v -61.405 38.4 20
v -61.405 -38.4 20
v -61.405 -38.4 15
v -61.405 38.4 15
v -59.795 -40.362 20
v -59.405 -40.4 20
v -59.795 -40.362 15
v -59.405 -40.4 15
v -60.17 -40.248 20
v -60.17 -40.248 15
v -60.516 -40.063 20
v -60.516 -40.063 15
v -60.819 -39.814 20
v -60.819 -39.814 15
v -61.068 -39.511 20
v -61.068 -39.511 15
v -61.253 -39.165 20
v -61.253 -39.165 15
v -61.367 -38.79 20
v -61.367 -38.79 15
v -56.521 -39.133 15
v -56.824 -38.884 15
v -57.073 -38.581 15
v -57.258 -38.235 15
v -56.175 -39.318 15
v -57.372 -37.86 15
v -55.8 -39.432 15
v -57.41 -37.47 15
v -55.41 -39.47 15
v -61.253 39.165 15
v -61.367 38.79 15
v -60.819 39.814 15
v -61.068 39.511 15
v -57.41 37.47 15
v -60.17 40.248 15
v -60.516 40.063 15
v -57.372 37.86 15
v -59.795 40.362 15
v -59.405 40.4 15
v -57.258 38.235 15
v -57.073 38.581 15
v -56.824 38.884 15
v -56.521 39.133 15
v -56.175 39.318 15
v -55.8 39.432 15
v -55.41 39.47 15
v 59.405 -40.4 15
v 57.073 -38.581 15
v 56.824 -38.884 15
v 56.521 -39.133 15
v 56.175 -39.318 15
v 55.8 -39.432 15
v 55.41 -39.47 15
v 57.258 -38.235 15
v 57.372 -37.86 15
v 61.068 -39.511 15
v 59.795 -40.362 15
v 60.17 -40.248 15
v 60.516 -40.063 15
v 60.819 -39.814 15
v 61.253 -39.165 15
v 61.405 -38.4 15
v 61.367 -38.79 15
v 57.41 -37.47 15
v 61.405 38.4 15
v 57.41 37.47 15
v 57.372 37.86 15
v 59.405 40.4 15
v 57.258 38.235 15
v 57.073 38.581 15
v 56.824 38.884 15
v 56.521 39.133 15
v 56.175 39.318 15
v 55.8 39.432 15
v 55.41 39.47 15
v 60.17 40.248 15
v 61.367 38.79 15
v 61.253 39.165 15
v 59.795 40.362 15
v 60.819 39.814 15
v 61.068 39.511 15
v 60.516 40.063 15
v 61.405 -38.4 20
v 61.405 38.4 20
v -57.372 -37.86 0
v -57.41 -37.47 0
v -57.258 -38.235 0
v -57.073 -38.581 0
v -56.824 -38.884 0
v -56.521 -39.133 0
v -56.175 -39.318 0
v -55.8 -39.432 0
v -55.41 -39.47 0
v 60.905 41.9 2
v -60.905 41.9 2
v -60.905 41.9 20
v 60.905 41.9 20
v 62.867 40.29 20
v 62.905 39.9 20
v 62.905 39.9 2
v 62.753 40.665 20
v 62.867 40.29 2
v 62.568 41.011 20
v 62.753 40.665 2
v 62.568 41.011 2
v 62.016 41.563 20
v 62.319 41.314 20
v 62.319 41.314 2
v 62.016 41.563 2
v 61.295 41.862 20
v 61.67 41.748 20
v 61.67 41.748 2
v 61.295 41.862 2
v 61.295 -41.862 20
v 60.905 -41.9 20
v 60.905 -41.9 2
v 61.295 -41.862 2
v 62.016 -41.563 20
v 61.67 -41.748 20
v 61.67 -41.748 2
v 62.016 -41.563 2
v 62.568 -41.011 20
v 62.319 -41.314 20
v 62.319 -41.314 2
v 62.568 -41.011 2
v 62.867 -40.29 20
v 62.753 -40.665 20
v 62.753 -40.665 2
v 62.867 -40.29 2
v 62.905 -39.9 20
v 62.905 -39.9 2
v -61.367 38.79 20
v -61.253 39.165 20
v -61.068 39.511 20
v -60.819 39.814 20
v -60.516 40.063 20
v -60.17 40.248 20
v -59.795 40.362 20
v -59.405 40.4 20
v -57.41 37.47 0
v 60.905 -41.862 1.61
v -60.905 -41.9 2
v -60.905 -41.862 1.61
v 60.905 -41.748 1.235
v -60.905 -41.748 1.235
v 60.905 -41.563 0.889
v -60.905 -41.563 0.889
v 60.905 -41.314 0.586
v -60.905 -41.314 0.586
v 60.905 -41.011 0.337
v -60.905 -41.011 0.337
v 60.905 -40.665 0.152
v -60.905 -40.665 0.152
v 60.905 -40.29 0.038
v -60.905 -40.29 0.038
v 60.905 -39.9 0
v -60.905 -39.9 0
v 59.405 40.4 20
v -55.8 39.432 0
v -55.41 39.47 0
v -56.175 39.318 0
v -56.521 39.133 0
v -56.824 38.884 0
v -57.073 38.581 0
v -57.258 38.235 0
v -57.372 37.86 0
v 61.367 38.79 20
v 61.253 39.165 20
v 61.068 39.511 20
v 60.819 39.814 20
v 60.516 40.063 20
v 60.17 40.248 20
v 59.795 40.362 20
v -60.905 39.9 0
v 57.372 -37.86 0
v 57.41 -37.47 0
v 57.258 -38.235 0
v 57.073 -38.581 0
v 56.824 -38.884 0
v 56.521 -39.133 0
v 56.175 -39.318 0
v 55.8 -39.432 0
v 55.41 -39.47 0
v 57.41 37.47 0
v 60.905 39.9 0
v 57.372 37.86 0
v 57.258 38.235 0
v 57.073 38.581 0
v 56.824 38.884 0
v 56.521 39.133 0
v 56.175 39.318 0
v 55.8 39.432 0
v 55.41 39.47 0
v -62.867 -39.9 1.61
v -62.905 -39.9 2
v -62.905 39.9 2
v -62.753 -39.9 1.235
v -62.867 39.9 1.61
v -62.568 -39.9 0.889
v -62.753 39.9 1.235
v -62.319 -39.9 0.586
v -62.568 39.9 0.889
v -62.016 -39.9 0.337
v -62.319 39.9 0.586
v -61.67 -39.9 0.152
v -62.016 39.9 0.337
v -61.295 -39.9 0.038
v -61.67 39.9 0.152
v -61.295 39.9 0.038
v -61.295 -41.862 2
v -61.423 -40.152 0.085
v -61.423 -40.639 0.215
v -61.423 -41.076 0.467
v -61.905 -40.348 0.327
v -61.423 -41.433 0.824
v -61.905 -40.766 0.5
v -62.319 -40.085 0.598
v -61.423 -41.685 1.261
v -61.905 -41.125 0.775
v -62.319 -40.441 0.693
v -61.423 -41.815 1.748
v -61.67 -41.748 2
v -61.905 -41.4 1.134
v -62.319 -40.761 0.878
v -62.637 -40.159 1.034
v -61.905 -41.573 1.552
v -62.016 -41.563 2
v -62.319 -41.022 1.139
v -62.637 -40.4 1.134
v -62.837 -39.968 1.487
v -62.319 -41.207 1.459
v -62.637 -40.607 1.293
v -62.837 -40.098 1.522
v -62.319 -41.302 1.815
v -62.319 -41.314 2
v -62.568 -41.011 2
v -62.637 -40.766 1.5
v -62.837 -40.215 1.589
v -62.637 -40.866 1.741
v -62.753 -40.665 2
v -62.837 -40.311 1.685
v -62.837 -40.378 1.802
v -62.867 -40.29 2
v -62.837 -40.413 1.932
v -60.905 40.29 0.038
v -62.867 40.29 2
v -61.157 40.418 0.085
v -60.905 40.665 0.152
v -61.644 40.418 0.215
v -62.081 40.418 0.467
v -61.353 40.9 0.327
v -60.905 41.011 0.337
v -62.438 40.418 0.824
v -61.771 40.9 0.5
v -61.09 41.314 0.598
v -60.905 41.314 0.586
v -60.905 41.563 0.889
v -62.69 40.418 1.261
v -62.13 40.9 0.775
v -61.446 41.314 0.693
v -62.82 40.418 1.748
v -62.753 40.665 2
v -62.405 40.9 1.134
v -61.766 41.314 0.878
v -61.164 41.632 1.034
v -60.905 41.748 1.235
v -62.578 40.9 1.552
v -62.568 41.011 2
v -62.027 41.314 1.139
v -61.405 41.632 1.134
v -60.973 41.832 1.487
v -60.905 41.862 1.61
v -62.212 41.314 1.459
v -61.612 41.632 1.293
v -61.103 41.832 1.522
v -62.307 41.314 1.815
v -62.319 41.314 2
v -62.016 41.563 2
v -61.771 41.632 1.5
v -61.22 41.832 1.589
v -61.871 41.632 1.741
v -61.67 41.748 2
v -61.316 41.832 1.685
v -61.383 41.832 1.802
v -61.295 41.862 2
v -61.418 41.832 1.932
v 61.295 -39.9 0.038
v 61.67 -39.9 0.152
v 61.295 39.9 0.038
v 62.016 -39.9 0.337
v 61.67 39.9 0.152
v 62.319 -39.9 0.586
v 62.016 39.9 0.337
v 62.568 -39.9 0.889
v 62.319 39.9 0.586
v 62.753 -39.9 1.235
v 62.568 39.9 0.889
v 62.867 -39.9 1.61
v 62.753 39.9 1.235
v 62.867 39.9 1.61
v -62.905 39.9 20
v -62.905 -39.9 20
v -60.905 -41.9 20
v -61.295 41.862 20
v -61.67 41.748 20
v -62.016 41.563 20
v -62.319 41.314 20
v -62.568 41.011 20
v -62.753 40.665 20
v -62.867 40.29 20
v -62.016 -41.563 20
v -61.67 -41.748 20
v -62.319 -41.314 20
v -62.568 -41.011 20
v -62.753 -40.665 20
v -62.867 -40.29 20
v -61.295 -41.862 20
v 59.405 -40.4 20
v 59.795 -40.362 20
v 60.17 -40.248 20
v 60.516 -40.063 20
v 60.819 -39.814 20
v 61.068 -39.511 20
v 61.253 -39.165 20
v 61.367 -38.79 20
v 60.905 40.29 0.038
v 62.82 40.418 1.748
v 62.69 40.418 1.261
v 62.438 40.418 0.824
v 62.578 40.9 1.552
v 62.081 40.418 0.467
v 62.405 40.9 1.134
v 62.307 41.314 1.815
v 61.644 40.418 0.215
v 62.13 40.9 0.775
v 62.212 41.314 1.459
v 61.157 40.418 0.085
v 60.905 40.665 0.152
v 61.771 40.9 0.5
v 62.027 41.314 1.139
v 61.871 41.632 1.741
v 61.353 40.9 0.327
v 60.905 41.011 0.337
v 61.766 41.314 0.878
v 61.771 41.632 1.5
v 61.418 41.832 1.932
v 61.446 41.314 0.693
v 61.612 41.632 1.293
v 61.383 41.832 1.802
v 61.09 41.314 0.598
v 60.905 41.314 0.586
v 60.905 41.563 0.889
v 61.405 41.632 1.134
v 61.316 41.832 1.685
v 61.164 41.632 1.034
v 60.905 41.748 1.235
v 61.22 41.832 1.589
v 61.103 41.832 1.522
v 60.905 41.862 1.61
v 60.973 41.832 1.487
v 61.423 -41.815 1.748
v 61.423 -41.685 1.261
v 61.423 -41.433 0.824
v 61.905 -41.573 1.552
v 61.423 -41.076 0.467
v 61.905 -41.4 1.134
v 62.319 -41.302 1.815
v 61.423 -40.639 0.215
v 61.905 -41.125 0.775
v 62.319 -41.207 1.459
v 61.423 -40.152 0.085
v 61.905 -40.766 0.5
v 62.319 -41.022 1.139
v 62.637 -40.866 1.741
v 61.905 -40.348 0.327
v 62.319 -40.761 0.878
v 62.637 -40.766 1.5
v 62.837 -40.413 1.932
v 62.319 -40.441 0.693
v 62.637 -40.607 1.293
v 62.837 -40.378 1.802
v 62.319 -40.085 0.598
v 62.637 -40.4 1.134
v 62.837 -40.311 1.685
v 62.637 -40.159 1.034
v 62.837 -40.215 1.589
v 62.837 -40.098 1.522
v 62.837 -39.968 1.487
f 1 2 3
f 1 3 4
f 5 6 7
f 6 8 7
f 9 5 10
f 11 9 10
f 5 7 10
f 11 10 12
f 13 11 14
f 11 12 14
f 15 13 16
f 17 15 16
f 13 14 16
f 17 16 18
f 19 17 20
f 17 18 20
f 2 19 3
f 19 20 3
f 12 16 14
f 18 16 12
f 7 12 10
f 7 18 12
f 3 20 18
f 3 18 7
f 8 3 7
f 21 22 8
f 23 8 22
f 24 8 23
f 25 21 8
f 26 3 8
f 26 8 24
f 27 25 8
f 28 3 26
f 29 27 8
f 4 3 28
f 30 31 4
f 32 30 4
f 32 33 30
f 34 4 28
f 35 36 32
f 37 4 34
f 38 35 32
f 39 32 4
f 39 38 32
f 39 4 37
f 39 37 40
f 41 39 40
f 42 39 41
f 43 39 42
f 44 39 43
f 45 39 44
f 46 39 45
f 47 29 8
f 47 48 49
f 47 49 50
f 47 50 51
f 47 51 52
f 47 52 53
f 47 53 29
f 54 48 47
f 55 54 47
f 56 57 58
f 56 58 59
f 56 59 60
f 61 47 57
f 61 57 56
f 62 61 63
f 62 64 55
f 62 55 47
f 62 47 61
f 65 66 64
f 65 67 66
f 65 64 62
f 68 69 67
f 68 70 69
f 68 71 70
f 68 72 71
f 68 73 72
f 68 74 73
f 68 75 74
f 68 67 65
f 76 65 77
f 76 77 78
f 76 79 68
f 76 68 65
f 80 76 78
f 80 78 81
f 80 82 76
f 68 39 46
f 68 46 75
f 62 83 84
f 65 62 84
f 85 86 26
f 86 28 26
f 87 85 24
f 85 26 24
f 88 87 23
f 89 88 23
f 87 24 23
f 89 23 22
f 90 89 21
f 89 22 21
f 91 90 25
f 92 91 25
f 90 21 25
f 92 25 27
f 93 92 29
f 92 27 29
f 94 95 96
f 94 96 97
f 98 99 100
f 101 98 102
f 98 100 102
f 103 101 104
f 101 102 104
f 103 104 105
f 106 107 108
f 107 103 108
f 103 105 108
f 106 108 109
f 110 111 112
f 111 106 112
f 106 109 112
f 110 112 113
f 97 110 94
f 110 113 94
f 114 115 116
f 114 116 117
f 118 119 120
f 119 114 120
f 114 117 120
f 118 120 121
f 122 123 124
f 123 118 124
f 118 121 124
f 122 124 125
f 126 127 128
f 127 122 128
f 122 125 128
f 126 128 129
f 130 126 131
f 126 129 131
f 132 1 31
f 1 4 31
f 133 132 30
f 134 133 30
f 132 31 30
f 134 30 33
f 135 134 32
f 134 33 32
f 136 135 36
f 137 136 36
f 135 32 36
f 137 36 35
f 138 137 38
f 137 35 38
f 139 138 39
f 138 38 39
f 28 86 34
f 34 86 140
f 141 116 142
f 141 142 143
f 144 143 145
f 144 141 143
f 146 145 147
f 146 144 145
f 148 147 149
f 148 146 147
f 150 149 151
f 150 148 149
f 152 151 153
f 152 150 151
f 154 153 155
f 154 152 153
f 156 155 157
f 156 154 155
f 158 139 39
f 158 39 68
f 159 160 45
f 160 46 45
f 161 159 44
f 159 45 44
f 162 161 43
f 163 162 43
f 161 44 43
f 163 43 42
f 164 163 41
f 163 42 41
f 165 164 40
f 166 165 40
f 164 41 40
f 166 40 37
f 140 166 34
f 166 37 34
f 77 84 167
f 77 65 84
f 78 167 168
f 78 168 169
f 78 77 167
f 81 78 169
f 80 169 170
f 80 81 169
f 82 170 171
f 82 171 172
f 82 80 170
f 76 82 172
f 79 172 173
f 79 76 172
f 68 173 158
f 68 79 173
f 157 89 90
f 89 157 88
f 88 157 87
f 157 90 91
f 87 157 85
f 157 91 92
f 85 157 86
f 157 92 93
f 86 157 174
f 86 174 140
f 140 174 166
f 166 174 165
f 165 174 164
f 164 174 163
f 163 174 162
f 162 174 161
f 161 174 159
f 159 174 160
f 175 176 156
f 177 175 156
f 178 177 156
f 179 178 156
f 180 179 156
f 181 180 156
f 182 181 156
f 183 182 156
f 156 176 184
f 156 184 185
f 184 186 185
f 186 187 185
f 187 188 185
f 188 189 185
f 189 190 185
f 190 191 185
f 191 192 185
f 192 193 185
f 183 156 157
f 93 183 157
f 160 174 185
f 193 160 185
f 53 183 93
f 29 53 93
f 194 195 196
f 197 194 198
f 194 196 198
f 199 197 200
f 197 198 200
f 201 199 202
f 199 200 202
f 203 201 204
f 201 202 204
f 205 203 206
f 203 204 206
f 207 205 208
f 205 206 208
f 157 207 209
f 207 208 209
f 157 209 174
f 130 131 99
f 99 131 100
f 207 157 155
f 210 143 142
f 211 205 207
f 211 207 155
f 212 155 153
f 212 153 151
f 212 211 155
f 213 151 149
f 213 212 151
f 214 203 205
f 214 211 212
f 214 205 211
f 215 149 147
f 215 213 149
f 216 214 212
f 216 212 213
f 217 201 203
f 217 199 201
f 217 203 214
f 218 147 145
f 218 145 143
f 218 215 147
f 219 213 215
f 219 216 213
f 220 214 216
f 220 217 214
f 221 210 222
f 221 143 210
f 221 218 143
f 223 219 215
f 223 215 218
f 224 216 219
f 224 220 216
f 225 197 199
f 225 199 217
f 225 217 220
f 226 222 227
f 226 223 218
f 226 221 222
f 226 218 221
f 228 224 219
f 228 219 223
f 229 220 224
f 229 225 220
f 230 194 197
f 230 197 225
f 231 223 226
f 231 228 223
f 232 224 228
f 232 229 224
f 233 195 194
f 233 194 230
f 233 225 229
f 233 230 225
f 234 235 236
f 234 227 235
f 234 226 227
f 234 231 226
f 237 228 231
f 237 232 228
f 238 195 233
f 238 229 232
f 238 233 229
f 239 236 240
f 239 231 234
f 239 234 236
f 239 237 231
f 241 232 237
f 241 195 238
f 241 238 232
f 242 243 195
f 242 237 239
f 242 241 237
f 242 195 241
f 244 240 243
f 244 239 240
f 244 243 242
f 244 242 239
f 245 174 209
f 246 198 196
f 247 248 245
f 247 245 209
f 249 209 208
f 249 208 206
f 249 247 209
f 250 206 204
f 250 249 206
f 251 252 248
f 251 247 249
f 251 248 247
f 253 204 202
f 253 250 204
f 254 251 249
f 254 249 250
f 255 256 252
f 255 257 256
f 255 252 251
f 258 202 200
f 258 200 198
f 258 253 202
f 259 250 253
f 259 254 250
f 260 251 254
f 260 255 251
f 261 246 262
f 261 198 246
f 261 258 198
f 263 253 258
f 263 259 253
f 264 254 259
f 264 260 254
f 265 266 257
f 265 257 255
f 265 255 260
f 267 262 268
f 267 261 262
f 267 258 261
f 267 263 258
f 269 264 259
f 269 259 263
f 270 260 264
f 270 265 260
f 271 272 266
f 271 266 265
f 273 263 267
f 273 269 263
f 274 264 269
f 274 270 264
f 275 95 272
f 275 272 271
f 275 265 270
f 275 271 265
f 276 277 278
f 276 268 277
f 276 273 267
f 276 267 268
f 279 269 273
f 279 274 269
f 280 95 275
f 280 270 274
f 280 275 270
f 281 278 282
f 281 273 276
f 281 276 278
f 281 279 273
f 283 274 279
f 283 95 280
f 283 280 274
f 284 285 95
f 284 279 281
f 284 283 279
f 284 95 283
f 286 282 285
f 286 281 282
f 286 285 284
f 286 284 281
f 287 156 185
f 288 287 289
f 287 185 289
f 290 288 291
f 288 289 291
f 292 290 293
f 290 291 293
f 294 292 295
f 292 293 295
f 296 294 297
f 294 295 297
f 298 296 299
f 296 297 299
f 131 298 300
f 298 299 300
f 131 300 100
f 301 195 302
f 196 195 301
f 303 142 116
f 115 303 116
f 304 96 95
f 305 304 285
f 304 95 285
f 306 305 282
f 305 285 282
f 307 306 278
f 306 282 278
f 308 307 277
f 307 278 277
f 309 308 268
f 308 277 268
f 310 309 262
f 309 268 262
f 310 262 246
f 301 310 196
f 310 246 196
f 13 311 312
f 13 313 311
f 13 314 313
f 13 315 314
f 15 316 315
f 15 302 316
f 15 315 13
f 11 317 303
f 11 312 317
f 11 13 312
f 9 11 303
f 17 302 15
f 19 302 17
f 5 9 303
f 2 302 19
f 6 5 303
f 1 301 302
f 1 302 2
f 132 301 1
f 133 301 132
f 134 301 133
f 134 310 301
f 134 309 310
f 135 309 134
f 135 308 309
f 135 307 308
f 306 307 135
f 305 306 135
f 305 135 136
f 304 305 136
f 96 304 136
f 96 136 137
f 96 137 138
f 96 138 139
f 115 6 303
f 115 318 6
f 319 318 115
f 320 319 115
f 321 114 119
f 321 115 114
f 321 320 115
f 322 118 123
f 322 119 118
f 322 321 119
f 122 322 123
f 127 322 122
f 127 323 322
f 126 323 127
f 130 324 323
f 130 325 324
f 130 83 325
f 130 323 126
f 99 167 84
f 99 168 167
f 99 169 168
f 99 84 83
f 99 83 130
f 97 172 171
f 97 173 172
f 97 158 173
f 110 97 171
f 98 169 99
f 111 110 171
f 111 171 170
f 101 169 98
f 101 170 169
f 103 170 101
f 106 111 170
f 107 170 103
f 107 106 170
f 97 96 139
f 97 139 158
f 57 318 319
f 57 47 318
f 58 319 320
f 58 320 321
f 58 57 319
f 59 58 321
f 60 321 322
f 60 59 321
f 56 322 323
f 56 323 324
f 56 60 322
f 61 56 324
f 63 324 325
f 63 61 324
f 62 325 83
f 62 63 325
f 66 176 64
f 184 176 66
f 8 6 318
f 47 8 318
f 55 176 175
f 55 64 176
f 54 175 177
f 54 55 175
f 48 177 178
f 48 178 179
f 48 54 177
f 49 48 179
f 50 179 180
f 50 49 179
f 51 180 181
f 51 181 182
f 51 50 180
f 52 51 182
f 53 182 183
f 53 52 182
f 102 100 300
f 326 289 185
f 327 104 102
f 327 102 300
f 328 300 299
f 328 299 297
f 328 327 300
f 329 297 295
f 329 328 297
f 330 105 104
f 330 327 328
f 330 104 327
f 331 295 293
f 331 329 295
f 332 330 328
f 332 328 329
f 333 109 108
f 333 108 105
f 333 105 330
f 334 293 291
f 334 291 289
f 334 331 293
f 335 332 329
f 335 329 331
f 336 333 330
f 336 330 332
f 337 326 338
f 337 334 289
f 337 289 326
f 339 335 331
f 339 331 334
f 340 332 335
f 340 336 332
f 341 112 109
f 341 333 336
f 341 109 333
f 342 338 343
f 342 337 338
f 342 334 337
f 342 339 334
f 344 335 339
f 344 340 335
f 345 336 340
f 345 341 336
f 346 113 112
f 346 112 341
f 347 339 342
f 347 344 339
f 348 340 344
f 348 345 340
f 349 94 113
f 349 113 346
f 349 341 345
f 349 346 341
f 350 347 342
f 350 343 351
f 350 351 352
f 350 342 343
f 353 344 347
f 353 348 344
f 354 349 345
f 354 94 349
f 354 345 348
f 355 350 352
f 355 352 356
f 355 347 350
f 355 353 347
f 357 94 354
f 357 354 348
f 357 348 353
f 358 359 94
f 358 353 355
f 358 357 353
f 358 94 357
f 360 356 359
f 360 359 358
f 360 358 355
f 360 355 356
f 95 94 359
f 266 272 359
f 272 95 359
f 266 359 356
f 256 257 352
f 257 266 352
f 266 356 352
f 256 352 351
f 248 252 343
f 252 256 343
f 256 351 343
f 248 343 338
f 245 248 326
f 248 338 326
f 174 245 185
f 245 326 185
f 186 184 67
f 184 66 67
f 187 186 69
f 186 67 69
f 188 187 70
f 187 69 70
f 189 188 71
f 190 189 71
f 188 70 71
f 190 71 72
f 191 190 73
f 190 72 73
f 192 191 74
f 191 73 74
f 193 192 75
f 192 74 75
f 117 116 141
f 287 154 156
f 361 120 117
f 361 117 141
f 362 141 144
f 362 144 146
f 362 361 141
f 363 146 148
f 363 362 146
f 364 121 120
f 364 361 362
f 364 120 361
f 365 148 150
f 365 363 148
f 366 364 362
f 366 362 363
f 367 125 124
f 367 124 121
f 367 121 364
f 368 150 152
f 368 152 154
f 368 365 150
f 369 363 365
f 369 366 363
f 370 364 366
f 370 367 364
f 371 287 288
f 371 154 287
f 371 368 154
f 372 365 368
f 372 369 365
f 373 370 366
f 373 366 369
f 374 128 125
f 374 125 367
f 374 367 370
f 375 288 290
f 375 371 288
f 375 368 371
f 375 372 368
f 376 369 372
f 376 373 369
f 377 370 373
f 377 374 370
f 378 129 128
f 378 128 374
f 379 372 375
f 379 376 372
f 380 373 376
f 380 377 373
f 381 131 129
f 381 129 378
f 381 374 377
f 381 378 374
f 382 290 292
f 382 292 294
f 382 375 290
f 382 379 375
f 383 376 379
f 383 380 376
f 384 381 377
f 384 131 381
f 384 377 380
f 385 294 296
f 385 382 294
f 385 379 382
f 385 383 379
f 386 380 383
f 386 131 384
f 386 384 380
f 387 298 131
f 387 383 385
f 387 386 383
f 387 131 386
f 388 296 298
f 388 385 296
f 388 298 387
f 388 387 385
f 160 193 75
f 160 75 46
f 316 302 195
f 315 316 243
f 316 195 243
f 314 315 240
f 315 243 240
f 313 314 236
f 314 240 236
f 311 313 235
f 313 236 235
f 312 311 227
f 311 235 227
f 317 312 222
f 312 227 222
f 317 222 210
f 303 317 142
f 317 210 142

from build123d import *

# Parameters (mm, degrees)
SKETCH_3_W          = 125.81
SKETCH_3_H          = 83.8
EXTRUDE_2_DEPTH     = 20
SKETCH_5_W          = 122.81
SKETCH_5_H          = 80.8
CUT_EXTRUDE_1_DEPTH = 5
SKETCH_6_W          = 114.82
SKETCH_6_H          = 78.94
CUT_EXTRUDE_2_DEPTH = 15
FILLET_1_R          = 2
FILLET_2_R          = 2
FILLET_3_R          = 2


with BuildPart() as part:
    # 草图3 → 凸台-拉伸2 (new body)
    with BuildSketch(Plane.XY):
        Rectangle(SKETCH_3_W, SKETCH_3_H)
    extrude(amount=EXTRUDE_2_DEPTH)

    # 草图5 → 切除-拉伸1 (cut)
    with BuildSketch(Plane.XY.offset(20)):
        Rectangle(SKETCH_5_W, SKETCH_5_H)
    extrude(amount=-CUT_EXTRUDE_1_DEPTH, mode=Mode.SUBTRACT)

    # 草图6 → 切除-拉伸2 (cut)
    with BuildSketch(Plane(origin=(0, 0, 0), x_dir=(-1, 0, 0), z_dir=(0, 0, -1))):
        Rectangle(SKETCH_6_W, SKETCH_6_H)
    extrude(amount=-CUT_EXTRUDE_2_DEPTH, mode=Mode.SUBTRACT)

    # 圆角1
    fillet_1_edges = [part.edges().sort_by_distance(p)[0] for p in [
        (0, -41.9, 0),
        (-62.905, 0, 0),
        (0, 41.9, 0),
        (62.905, 0, 0),
    ]]
    fillet(fillet_1_edges, radius=FILLET_1_R)

    # 圆角2
    # the kernel refuses this fillet: 2 mm, written as the material it takes off along each edge
    with BuildSketch(Plane(origin=(60.905, -39.9, 2), x_dir=(0, -1, 0), z_dir=(1, 0, 0))) as fillet_2_piece_1_section:
        Polygon((0, 0), (FILLET_2_R, 0), (FILLET_2_R, FILLET_2_R), (0, FILLET_2_R), align=None)
    fillet_2_piece_1 = extrude(amount=FILLET_2_R, mode=Mode.PRIVATE)
    fillet_2_piece_1 = fillet_2_piece_1 - Plane(origin=(60.905, -39.9, 2), x_dir=(0, 0.7071067811865475, 0.7071067811865475), z_dir=(1, 0, 0)) * Sphere(FILLET_2_R, mode=Mode.PRIVATE)
    add(fillet_2_piece_1, mode=Mode.SUBTRACT)
    with BuildSketch(Plane(origin=(-60.905, -39.9, 2), x_dir=(0, -1, 0), z_dir=(-1, 0, 0))) as fillet_2_piece_2_section:
        Polygon((0, 0), (FILLET_2_R, 0), (FILLET_2_R, -FILLET_2_R), (0, -FILLET_2_R), align=None)
    fillet_2_piece_2 = extrude(amount=FILLET_2_R, mode=Mode.PRIVATE)
    fillet_2_piece_2 = fillet_2_piece_2 - Plane(origin=(-60.905, -39.9, 2), x_dir=(0, 0.7071067811865475, 0.7071067811865475), z_dir=(-1, 0, 0)) * Sphere(FILLET_2_R, mode=Mode.PRIVATE)
    add(fillet_2_piece_2, mode=Mode.SUBTRACT)
    with BuildSketch(Plane(origin=(60.905, 39.9, 2), x_dir=(1, 0, 0), z_dir=(0, 1, 0))) as fillet_2_piece_3_section:
        Polygon((0, 0), (FILLET_2_R, 0), (FILLET_2_R, FILLET_2_R), (0, FILLET_2_R), align=None)
    fillet_2_piece_3 = extrude(amount=FILLET_2_R, mode=Mode.PRIVATE)
    fillet_2_piece_3 = fillet_2_piece_3 - Plane(origin=(60.905, 39.9, 2), x_dir=(-0.7071067811865475, 0, 0.7071067811865475), z_dir=(0, 1, 0)) * Sphere(FILLET_2_R, mode=Mode.PRIVATE)
    add(fillet_2_piece_3, mode=Mode.SUBTRACT)
    with BuildSketch(Plane(origin=(-60.905, 39.9, 2), x_dir=(-1, 0, 0), z_dir=(0, 1, 0))) as fillet_2_piece_4_section:
        Polygon((0, 0), (FILLET_2_R, 0), (FILLET_2_R, -FILLET_2_R), (0, -FILLET_2_R), align=None)
    fillet_2_piece_4 = extrude(amount=FILLET_2_R, mode=Mode.PRIVATE)
    fillet_2_piece_4 = fillet_2_piece_4 - Plane(origin=(-60.905, 39.9, 2), x_dir=(0.7071067811865475, 0, 0.7071067811865475), z_dir=(0, 1, 0)) * Sphere(FILLET_2_R, mode=Mode.PRIVATE)
    add(fillet_2_piece_4, mode=Mode.SUBTRACT)
    with BuildSketch(Plane(origin=(62.905, -41.9, 2), x_dir=(0, 1, 0), z_dir=(0, 0, 1)), Plane(origin=(62.905, 41.9, 2), x_dir=(-1, 0, 0), z_dir=(0, 0, 1))) as fillet_2_piece_5:
        with BuildLine():
            CenterArc((FILLET_2_R, FILLET_2_R), FILLET_2_R, 180, 90)
            Line((0, FILLET_2_R), (0, 0))
            Line((0, 0), (FILLET_2_R, 0))
        make_face()
    extrude(amount=23, mode=Mode.SUBTRACT)
    with BuildSketch(Plane(origin=(-62.905, -41.9, 2), x_dir=(0, 1, 0), z_dir=(0, 0, 1)), Plane(origin=(-62.905, 41.9, 2), x_dir=(1, 0, 0), z_dir=(0, 0, 1))) as fillet_2_piece_6:
        with BuildLine():
            CenterArc((FILLET_2_R, -FILLET_2_R), FILLET_2_R, 90, 90)
            Line((0, -FILLET_2_R), (0, 0))
            Line((0, 0), (FILLET_2_R, 0))
        make_face()
    extrude(amount=23, mode=Mode.SUBTRACT)

    # 圆角3
    fillet_3_edges = [part.edges().sort_by_distance(p)[0] for p in [
        (61.405, 40.4, 17.5),
        (61.405, -40.4, 17.5),
        (-61.405, -40.4, 17.5),
        (-61.405, 40.4, 17.5),
        (-57.41, 39.47, 7.5),
        (-57.41, -39.47, 7.5),
        (57.41, -39.47, 7.5),
        (57.41, 39.47, 7.5),
    ]]
    fillet(fillet_3_edges, radius=FILLET_3_R)


solid = part.part
